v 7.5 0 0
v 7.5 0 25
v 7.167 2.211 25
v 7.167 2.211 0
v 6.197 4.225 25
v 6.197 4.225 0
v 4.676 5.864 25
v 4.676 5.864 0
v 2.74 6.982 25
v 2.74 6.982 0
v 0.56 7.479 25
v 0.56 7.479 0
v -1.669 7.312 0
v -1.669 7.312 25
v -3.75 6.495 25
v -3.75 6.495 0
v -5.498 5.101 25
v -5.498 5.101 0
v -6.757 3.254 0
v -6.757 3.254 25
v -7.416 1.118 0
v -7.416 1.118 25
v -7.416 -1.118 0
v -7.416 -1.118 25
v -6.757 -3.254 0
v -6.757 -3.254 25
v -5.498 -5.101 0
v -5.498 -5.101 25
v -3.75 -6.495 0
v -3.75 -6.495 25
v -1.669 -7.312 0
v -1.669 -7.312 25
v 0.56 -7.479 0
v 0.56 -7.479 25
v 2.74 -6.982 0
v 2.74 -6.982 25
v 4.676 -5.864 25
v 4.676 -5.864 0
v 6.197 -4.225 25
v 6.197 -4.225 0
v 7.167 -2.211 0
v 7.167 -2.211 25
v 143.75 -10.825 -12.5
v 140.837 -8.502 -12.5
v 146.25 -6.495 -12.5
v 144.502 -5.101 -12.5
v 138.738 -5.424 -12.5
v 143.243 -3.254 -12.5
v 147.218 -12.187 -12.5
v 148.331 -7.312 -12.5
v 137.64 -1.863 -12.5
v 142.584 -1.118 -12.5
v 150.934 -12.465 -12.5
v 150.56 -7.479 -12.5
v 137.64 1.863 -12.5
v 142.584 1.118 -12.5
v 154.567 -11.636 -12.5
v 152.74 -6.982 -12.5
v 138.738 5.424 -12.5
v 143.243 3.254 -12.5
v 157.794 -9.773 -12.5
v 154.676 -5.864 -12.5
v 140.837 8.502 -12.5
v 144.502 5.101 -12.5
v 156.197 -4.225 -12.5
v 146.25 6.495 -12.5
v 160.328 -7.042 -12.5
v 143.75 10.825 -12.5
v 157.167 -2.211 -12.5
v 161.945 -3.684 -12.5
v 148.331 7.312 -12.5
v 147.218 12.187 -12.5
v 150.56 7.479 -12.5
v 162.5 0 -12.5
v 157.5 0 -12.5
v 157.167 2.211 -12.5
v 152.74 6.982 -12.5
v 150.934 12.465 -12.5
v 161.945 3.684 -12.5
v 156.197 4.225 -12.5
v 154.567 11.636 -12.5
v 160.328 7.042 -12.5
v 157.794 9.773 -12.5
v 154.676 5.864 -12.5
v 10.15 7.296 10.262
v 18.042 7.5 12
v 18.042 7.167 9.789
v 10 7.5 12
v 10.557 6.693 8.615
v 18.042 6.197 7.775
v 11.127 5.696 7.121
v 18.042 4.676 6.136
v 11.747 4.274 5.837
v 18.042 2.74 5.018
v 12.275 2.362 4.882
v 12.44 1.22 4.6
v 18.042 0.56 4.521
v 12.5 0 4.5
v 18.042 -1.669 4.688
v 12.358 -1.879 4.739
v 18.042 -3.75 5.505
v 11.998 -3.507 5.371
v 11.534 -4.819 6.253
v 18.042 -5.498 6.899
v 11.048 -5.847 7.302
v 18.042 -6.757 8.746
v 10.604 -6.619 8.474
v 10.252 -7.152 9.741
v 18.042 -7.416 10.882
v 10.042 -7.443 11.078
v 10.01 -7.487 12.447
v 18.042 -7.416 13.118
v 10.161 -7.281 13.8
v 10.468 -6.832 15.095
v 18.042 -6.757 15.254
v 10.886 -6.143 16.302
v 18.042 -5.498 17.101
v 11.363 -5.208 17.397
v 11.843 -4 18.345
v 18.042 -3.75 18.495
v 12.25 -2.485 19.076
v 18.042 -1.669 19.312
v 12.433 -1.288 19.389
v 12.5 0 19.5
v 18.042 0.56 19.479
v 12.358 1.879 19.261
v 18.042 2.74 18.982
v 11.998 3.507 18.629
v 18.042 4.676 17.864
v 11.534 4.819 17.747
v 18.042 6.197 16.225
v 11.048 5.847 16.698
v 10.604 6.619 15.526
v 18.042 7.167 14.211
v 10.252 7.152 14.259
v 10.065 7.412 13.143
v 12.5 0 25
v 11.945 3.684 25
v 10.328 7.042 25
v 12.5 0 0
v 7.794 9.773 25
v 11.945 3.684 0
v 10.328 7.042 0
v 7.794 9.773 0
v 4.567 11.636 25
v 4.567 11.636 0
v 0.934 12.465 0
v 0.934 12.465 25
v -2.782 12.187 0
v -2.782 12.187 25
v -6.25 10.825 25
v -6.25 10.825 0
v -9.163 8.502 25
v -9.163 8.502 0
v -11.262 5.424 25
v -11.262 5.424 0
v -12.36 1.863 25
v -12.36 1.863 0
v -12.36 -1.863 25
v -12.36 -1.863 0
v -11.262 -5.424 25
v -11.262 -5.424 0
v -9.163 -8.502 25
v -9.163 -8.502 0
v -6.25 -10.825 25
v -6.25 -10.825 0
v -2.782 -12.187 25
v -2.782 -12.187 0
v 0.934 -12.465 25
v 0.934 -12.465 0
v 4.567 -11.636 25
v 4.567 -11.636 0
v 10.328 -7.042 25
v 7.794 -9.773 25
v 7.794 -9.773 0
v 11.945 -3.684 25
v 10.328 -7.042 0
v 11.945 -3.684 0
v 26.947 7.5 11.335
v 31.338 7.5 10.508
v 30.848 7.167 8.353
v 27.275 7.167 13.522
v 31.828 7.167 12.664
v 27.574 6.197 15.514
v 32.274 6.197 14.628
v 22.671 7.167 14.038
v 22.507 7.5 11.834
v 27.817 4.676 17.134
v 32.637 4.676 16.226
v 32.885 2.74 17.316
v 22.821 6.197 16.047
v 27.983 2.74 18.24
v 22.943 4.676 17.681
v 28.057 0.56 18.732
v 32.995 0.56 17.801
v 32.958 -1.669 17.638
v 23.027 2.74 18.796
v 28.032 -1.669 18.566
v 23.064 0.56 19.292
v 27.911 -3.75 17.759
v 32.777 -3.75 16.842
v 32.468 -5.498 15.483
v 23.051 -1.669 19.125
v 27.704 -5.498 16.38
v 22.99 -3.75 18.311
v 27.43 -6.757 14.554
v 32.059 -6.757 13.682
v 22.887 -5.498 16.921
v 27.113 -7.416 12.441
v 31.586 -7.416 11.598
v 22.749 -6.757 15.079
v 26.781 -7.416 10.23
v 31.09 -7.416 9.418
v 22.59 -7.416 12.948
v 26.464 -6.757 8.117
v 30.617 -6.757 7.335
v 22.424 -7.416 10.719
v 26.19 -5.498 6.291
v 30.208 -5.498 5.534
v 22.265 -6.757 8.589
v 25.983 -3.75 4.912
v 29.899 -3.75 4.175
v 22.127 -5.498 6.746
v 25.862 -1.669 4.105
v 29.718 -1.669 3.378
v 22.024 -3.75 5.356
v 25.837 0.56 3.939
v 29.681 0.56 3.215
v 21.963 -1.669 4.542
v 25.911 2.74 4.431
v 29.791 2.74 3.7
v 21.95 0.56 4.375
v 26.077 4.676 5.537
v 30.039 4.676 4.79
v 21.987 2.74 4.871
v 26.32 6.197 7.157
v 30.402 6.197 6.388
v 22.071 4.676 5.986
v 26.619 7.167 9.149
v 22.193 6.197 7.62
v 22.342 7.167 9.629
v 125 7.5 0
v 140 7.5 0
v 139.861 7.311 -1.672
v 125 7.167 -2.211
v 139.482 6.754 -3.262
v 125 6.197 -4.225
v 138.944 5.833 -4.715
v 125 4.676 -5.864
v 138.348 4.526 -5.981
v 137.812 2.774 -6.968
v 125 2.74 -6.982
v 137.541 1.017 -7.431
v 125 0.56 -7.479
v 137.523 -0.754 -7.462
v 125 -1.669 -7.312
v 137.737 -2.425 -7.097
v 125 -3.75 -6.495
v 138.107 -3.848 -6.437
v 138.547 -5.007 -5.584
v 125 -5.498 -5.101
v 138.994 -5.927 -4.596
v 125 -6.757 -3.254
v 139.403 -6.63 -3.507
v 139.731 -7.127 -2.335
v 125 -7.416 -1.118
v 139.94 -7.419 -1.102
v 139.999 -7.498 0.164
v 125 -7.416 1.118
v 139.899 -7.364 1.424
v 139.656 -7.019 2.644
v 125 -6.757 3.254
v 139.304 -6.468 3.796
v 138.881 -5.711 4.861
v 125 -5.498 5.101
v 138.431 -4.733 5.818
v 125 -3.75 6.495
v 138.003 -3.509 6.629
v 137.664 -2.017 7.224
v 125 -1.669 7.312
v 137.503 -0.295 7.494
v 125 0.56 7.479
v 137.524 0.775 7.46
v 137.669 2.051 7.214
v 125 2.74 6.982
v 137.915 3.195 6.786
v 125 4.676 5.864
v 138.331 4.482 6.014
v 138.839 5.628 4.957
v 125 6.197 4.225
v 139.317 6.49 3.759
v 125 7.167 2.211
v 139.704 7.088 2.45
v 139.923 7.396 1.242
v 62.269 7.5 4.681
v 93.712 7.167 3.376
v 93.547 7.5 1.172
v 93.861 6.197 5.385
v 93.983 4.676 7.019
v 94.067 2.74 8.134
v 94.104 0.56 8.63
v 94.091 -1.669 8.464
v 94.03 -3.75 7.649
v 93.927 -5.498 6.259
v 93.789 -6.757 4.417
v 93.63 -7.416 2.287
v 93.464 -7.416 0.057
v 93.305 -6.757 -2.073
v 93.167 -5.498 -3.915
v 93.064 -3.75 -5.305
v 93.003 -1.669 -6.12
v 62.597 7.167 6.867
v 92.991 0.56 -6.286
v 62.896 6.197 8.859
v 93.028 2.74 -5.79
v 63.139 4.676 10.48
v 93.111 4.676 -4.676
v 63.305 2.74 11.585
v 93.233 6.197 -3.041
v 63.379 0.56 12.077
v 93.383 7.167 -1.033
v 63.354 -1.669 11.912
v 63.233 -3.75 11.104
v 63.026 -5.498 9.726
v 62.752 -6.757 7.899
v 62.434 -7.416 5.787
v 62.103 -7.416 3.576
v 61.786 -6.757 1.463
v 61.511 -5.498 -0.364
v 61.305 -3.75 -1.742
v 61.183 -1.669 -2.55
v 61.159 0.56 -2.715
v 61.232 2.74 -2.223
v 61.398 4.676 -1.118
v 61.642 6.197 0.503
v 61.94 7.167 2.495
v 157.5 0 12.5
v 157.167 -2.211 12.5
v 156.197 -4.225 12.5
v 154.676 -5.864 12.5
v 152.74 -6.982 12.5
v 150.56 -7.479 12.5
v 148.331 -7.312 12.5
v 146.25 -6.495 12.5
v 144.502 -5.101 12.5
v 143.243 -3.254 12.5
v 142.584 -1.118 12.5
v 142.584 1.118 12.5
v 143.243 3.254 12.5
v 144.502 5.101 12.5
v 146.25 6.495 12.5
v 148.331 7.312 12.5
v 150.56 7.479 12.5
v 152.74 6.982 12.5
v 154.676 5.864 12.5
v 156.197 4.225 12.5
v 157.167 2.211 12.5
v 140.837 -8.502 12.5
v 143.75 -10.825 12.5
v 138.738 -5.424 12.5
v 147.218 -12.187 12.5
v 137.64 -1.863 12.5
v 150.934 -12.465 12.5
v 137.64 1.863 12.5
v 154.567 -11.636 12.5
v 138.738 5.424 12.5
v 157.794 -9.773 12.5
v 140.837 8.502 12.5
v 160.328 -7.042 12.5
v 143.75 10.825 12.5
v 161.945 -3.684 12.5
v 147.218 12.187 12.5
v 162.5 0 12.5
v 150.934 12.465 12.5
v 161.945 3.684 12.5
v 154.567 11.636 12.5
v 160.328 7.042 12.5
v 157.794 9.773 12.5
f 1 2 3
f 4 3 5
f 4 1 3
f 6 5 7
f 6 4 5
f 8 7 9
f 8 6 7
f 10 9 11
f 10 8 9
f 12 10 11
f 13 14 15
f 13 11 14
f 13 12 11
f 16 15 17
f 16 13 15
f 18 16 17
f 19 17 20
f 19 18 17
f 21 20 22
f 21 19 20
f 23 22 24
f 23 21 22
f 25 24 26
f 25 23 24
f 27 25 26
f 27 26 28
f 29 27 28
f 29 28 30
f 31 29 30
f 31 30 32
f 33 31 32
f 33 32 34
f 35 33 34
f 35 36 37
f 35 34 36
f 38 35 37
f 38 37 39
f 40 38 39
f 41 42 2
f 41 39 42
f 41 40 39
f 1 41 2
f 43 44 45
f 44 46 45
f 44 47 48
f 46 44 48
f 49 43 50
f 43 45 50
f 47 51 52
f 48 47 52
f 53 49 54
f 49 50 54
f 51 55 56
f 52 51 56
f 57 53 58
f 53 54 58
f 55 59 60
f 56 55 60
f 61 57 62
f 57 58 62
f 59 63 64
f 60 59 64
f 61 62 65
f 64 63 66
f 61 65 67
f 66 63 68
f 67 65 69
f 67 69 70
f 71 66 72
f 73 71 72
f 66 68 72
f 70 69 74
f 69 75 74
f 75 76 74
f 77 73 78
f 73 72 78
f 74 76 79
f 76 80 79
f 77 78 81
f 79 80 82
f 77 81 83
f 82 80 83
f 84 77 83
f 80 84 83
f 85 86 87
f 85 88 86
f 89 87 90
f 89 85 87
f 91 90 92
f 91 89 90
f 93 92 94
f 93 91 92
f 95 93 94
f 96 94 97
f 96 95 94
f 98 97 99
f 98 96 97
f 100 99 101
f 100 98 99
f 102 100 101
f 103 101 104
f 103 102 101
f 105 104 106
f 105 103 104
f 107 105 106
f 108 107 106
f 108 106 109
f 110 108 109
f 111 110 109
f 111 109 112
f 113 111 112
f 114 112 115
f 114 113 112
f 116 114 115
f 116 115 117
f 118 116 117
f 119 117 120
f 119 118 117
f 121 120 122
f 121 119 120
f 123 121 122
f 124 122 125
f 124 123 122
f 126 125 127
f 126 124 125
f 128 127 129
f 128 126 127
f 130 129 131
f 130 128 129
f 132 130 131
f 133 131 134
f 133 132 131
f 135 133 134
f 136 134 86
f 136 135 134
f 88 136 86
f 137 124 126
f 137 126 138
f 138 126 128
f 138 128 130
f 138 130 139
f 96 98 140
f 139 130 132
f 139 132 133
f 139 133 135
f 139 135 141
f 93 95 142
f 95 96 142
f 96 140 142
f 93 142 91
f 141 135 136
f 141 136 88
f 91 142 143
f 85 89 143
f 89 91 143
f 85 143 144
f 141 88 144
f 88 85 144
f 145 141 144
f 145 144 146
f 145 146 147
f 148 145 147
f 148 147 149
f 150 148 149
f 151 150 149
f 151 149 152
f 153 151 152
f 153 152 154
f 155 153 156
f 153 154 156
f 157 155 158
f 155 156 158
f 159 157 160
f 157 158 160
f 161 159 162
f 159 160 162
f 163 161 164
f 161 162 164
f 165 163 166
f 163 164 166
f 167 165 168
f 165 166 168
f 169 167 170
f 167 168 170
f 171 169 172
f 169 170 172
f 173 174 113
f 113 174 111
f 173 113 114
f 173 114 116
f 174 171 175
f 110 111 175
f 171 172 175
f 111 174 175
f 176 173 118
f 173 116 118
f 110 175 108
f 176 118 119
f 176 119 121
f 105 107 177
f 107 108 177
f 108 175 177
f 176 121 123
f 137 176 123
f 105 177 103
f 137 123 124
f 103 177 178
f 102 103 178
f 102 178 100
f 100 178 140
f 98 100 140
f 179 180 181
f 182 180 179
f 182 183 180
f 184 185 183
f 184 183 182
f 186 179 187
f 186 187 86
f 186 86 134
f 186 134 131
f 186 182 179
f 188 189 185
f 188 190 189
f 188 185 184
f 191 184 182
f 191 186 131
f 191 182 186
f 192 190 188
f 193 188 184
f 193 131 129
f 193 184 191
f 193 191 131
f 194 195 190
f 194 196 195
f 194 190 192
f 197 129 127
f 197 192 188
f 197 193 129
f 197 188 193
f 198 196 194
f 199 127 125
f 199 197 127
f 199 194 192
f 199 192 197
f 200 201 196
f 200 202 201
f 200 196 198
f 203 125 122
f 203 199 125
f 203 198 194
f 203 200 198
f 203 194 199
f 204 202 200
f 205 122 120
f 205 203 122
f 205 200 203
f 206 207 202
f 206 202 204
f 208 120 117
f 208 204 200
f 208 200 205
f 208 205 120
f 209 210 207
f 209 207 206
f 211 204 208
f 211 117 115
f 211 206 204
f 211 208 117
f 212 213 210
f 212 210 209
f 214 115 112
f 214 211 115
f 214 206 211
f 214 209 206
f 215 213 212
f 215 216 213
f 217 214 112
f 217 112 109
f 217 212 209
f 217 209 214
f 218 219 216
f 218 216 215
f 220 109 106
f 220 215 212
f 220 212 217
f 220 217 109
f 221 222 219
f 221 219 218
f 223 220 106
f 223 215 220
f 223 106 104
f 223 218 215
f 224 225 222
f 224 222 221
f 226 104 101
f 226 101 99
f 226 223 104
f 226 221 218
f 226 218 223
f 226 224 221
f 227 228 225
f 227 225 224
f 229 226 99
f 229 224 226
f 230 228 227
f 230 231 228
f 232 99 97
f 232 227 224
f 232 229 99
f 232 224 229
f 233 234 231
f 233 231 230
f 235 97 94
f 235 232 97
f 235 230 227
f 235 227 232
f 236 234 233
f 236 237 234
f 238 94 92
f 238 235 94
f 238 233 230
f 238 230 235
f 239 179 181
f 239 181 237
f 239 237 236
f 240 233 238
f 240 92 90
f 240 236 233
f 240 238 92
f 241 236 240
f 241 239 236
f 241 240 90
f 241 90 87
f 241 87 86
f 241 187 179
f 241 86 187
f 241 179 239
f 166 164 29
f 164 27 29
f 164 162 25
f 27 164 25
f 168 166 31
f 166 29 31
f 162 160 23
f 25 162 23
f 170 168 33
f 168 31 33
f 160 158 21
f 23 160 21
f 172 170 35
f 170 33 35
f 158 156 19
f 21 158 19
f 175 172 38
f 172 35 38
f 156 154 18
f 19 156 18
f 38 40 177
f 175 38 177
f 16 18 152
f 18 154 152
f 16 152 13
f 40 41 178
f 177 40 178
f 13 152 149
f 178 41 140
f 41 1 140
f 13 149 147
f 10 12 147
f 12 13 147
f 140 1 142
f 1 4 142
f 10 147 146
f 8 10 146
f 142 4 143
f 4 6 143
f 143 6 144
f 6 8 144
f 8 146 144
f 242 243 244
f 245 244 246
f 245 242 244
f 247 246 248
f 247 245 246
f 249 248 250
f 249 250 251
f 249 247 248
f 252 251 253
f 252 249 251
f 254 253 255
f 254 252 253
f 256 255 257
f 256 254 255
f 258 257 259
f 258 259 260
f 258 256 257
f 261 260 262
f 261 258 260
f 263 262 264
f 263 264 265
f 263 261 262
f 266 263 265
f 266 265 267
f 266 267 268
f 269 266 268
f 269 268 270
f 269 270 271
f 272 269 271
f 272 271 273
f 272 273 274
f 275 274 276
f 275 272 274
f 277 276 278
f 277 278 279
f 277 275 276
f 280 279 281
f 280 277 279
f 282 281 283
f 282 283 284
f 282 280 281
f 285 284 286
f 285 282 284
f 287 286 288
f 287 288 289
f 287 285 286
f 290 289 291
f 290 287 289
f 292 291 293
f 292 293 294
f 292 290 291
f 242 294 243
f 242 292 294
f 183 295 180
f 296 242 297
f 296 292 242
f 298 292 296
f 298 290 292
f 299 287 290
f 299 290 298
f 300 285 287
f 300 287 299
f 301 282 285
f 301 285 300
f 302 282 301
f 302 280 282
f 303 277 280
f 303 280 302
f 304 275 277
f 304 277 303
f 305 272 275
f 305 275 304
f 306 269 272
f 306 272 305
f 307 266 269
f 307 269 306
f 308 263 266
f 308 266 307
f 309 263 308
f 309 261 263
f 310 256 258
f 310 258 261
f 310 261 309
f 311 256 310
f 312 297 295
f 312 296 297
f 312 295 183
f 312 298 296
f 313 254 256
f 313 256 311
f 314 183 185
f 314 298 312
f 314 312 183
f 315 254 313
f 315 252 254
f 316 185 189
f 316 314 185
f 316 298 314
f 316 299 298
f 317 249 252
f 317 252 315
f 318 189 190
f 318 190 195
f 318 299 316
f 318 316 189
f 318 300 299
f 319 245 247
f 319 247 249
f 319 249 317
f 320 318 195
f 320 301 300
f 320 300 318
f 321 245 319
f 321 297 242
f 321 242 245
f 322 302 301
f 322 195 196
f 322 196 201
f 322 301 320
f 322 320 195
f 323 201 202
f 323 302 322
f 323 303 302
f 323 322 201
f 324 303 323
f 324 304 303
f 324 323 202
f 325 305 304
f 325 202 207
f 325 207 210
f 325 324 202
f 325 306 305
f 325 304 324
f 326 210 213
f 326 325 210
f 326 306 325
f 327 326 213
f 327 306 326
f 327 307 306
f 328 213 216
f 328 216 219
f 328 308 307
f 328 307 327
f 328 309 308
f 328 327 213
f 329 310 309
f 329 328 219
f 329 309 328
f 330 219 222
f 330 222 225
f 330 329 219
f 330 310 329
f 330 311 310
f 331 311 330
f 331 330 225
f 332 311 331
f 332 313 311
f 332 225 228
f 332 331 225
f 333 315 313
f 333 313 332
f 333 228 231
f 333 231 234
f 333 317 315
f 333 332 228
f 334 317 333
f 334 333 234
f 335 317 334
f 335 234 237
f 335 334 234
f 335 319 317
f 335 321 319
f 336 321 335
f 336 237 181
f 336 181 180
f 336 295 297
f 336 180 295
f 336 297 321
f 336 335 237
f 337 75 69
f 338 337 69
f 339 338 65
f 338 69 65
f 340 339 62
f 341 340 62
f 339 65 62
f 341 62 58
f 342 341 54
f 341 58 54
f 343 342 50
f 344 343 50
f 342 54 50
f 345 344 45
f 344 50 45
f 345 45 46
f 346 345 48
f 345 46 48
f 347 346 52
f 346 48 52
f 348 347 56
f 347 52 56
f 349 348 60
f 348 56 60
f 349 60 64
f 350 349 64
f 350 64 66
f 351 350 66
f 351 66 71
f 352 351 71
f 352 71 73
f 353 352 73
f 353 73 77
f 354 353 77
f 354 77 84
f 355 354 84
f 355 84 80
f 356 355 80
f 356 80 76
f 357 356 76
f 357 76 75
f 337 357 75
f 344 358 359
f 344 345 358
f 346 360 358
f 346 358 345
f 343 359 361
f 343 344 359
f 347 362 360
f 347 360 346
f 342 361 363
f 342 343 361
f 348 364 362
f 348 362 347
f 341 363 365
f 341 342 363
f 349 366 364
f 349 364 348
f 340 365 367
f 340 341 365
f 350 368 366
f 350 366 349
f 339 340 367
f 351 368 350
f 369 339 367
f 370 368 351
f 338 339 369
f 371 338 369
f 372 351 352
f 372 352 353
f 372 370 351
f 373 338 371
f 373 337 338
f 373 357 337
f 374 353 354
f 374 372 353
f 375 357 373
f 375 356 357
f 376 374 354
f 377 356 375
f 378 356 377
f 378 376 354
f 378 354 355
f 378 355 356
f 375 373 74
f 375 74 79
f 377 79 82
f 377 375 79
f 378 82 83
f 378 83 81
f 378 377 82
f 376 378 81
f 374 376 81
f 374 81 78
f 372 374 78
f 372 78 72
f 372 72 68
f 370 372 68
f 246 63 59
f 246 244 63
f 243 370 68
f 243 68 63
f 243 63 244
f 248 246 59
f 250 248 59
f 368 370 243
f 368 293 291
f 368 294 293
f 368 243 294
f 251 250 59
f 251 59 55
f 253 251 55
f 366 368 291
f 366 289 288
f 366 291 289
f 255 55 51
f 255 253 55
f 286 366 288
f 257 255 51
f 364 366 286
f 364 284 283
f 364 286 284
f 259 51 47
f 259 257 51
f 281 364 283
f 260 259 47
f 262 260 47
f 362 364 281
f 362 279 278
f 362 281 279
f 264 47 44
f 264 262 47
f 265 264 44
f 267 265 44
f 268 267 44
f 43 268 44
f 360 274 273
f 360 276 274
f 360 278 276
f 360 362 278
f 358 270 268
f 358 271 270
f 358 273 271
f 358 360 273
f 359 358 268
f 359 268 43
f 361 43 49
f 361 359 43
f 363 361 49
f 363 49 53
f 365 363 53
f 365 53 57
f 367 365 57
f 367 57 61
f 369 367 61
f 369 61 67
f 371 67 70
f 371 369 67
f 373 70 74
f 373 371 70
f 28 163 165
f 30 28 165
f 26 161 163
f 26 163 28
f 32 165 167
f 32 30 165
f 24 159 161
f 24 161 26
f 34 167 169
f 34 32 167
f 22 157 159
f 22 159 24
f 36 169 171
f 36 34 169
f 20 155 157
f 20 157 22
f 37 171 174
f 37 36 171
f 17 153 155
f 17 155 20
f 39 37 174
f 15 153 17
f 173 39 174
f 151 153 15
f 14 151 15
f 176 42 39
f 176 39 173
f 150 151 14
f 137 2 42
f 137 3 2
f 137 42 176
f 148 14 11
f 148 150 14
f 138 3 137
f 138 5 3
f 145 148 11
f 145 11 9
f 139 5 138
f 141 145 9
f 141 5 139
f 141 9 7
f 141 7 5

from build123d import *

# Parameters (mm, degrees)
F1_R      = 7.5
F3_R      = 12.5
F3_R_2    = 7.5
F4_DEPTH  = 25
F5_DEPTH  = 25.0010001
F7_R      = 12.5
F8_DEPTH  = 12.5
F9_R      = 7.5
F10_DEPTH = 37.5010001


with BuildPart() as f2:
    # F2: sweep along a path in F0
    with BuildLine(Plane.XZ) as f2_path:
        Line((150, 0), (125, 0))
        ThreePointArc((125, 0), (77.8751511279, 2.6352872081), (31.3379403225, 10.5082872928))
        ThreePointArc((31.3379403225, 10.5082872928), (24.7317116593, 11.6259056014), (18.042064343, 12))
        Line((18.042064343, 12), (0, 12))
    # F1 (on Right) → F2 (sweep)
    with BuildSketch(Plane.YZ):
        with Locations((0, 12)):
            Circle(F1_R)
    sweep(path=f2_path.line)

    # F3 (on Top) → F4 (join)
    with BuildSketch(Plane.XY):
        Circle(F3_R)
        Circle(F3_R_2, mode=Mode.SUBTRACT)
        Circle(F3_R_2)
    extrude(amount=F4_DEPTH)

    # F3 (on Top) → F5 (cut, through all)
    with BuildSketch(Plane.XY):
        Circle(F3_R_2)
    extrude(amount=F5_DEPTH, mode=Mode.SUBTRACT)

    # F7 (on Top) → F8 (join, symmetric)
    with BuildSketch(Plane.XY):
        with Locations((150, 0)):
            Circle(F7_R)
    extrude(amount=F8_DEPTH, both=True)

    # F9 (on face) → F10 (cut, through all)
    with BuildSketch(Plane(origin=(0, 0, -12.5), x_dir=(1, 0, 0), z_dir=(0, 0, -1))):
        with Locations((150, 0)):
            Circle(F9_R)
    extrude(amount=-F10_DEPTH, mode=Mode.SUBTRACT)


solid = f2.part
